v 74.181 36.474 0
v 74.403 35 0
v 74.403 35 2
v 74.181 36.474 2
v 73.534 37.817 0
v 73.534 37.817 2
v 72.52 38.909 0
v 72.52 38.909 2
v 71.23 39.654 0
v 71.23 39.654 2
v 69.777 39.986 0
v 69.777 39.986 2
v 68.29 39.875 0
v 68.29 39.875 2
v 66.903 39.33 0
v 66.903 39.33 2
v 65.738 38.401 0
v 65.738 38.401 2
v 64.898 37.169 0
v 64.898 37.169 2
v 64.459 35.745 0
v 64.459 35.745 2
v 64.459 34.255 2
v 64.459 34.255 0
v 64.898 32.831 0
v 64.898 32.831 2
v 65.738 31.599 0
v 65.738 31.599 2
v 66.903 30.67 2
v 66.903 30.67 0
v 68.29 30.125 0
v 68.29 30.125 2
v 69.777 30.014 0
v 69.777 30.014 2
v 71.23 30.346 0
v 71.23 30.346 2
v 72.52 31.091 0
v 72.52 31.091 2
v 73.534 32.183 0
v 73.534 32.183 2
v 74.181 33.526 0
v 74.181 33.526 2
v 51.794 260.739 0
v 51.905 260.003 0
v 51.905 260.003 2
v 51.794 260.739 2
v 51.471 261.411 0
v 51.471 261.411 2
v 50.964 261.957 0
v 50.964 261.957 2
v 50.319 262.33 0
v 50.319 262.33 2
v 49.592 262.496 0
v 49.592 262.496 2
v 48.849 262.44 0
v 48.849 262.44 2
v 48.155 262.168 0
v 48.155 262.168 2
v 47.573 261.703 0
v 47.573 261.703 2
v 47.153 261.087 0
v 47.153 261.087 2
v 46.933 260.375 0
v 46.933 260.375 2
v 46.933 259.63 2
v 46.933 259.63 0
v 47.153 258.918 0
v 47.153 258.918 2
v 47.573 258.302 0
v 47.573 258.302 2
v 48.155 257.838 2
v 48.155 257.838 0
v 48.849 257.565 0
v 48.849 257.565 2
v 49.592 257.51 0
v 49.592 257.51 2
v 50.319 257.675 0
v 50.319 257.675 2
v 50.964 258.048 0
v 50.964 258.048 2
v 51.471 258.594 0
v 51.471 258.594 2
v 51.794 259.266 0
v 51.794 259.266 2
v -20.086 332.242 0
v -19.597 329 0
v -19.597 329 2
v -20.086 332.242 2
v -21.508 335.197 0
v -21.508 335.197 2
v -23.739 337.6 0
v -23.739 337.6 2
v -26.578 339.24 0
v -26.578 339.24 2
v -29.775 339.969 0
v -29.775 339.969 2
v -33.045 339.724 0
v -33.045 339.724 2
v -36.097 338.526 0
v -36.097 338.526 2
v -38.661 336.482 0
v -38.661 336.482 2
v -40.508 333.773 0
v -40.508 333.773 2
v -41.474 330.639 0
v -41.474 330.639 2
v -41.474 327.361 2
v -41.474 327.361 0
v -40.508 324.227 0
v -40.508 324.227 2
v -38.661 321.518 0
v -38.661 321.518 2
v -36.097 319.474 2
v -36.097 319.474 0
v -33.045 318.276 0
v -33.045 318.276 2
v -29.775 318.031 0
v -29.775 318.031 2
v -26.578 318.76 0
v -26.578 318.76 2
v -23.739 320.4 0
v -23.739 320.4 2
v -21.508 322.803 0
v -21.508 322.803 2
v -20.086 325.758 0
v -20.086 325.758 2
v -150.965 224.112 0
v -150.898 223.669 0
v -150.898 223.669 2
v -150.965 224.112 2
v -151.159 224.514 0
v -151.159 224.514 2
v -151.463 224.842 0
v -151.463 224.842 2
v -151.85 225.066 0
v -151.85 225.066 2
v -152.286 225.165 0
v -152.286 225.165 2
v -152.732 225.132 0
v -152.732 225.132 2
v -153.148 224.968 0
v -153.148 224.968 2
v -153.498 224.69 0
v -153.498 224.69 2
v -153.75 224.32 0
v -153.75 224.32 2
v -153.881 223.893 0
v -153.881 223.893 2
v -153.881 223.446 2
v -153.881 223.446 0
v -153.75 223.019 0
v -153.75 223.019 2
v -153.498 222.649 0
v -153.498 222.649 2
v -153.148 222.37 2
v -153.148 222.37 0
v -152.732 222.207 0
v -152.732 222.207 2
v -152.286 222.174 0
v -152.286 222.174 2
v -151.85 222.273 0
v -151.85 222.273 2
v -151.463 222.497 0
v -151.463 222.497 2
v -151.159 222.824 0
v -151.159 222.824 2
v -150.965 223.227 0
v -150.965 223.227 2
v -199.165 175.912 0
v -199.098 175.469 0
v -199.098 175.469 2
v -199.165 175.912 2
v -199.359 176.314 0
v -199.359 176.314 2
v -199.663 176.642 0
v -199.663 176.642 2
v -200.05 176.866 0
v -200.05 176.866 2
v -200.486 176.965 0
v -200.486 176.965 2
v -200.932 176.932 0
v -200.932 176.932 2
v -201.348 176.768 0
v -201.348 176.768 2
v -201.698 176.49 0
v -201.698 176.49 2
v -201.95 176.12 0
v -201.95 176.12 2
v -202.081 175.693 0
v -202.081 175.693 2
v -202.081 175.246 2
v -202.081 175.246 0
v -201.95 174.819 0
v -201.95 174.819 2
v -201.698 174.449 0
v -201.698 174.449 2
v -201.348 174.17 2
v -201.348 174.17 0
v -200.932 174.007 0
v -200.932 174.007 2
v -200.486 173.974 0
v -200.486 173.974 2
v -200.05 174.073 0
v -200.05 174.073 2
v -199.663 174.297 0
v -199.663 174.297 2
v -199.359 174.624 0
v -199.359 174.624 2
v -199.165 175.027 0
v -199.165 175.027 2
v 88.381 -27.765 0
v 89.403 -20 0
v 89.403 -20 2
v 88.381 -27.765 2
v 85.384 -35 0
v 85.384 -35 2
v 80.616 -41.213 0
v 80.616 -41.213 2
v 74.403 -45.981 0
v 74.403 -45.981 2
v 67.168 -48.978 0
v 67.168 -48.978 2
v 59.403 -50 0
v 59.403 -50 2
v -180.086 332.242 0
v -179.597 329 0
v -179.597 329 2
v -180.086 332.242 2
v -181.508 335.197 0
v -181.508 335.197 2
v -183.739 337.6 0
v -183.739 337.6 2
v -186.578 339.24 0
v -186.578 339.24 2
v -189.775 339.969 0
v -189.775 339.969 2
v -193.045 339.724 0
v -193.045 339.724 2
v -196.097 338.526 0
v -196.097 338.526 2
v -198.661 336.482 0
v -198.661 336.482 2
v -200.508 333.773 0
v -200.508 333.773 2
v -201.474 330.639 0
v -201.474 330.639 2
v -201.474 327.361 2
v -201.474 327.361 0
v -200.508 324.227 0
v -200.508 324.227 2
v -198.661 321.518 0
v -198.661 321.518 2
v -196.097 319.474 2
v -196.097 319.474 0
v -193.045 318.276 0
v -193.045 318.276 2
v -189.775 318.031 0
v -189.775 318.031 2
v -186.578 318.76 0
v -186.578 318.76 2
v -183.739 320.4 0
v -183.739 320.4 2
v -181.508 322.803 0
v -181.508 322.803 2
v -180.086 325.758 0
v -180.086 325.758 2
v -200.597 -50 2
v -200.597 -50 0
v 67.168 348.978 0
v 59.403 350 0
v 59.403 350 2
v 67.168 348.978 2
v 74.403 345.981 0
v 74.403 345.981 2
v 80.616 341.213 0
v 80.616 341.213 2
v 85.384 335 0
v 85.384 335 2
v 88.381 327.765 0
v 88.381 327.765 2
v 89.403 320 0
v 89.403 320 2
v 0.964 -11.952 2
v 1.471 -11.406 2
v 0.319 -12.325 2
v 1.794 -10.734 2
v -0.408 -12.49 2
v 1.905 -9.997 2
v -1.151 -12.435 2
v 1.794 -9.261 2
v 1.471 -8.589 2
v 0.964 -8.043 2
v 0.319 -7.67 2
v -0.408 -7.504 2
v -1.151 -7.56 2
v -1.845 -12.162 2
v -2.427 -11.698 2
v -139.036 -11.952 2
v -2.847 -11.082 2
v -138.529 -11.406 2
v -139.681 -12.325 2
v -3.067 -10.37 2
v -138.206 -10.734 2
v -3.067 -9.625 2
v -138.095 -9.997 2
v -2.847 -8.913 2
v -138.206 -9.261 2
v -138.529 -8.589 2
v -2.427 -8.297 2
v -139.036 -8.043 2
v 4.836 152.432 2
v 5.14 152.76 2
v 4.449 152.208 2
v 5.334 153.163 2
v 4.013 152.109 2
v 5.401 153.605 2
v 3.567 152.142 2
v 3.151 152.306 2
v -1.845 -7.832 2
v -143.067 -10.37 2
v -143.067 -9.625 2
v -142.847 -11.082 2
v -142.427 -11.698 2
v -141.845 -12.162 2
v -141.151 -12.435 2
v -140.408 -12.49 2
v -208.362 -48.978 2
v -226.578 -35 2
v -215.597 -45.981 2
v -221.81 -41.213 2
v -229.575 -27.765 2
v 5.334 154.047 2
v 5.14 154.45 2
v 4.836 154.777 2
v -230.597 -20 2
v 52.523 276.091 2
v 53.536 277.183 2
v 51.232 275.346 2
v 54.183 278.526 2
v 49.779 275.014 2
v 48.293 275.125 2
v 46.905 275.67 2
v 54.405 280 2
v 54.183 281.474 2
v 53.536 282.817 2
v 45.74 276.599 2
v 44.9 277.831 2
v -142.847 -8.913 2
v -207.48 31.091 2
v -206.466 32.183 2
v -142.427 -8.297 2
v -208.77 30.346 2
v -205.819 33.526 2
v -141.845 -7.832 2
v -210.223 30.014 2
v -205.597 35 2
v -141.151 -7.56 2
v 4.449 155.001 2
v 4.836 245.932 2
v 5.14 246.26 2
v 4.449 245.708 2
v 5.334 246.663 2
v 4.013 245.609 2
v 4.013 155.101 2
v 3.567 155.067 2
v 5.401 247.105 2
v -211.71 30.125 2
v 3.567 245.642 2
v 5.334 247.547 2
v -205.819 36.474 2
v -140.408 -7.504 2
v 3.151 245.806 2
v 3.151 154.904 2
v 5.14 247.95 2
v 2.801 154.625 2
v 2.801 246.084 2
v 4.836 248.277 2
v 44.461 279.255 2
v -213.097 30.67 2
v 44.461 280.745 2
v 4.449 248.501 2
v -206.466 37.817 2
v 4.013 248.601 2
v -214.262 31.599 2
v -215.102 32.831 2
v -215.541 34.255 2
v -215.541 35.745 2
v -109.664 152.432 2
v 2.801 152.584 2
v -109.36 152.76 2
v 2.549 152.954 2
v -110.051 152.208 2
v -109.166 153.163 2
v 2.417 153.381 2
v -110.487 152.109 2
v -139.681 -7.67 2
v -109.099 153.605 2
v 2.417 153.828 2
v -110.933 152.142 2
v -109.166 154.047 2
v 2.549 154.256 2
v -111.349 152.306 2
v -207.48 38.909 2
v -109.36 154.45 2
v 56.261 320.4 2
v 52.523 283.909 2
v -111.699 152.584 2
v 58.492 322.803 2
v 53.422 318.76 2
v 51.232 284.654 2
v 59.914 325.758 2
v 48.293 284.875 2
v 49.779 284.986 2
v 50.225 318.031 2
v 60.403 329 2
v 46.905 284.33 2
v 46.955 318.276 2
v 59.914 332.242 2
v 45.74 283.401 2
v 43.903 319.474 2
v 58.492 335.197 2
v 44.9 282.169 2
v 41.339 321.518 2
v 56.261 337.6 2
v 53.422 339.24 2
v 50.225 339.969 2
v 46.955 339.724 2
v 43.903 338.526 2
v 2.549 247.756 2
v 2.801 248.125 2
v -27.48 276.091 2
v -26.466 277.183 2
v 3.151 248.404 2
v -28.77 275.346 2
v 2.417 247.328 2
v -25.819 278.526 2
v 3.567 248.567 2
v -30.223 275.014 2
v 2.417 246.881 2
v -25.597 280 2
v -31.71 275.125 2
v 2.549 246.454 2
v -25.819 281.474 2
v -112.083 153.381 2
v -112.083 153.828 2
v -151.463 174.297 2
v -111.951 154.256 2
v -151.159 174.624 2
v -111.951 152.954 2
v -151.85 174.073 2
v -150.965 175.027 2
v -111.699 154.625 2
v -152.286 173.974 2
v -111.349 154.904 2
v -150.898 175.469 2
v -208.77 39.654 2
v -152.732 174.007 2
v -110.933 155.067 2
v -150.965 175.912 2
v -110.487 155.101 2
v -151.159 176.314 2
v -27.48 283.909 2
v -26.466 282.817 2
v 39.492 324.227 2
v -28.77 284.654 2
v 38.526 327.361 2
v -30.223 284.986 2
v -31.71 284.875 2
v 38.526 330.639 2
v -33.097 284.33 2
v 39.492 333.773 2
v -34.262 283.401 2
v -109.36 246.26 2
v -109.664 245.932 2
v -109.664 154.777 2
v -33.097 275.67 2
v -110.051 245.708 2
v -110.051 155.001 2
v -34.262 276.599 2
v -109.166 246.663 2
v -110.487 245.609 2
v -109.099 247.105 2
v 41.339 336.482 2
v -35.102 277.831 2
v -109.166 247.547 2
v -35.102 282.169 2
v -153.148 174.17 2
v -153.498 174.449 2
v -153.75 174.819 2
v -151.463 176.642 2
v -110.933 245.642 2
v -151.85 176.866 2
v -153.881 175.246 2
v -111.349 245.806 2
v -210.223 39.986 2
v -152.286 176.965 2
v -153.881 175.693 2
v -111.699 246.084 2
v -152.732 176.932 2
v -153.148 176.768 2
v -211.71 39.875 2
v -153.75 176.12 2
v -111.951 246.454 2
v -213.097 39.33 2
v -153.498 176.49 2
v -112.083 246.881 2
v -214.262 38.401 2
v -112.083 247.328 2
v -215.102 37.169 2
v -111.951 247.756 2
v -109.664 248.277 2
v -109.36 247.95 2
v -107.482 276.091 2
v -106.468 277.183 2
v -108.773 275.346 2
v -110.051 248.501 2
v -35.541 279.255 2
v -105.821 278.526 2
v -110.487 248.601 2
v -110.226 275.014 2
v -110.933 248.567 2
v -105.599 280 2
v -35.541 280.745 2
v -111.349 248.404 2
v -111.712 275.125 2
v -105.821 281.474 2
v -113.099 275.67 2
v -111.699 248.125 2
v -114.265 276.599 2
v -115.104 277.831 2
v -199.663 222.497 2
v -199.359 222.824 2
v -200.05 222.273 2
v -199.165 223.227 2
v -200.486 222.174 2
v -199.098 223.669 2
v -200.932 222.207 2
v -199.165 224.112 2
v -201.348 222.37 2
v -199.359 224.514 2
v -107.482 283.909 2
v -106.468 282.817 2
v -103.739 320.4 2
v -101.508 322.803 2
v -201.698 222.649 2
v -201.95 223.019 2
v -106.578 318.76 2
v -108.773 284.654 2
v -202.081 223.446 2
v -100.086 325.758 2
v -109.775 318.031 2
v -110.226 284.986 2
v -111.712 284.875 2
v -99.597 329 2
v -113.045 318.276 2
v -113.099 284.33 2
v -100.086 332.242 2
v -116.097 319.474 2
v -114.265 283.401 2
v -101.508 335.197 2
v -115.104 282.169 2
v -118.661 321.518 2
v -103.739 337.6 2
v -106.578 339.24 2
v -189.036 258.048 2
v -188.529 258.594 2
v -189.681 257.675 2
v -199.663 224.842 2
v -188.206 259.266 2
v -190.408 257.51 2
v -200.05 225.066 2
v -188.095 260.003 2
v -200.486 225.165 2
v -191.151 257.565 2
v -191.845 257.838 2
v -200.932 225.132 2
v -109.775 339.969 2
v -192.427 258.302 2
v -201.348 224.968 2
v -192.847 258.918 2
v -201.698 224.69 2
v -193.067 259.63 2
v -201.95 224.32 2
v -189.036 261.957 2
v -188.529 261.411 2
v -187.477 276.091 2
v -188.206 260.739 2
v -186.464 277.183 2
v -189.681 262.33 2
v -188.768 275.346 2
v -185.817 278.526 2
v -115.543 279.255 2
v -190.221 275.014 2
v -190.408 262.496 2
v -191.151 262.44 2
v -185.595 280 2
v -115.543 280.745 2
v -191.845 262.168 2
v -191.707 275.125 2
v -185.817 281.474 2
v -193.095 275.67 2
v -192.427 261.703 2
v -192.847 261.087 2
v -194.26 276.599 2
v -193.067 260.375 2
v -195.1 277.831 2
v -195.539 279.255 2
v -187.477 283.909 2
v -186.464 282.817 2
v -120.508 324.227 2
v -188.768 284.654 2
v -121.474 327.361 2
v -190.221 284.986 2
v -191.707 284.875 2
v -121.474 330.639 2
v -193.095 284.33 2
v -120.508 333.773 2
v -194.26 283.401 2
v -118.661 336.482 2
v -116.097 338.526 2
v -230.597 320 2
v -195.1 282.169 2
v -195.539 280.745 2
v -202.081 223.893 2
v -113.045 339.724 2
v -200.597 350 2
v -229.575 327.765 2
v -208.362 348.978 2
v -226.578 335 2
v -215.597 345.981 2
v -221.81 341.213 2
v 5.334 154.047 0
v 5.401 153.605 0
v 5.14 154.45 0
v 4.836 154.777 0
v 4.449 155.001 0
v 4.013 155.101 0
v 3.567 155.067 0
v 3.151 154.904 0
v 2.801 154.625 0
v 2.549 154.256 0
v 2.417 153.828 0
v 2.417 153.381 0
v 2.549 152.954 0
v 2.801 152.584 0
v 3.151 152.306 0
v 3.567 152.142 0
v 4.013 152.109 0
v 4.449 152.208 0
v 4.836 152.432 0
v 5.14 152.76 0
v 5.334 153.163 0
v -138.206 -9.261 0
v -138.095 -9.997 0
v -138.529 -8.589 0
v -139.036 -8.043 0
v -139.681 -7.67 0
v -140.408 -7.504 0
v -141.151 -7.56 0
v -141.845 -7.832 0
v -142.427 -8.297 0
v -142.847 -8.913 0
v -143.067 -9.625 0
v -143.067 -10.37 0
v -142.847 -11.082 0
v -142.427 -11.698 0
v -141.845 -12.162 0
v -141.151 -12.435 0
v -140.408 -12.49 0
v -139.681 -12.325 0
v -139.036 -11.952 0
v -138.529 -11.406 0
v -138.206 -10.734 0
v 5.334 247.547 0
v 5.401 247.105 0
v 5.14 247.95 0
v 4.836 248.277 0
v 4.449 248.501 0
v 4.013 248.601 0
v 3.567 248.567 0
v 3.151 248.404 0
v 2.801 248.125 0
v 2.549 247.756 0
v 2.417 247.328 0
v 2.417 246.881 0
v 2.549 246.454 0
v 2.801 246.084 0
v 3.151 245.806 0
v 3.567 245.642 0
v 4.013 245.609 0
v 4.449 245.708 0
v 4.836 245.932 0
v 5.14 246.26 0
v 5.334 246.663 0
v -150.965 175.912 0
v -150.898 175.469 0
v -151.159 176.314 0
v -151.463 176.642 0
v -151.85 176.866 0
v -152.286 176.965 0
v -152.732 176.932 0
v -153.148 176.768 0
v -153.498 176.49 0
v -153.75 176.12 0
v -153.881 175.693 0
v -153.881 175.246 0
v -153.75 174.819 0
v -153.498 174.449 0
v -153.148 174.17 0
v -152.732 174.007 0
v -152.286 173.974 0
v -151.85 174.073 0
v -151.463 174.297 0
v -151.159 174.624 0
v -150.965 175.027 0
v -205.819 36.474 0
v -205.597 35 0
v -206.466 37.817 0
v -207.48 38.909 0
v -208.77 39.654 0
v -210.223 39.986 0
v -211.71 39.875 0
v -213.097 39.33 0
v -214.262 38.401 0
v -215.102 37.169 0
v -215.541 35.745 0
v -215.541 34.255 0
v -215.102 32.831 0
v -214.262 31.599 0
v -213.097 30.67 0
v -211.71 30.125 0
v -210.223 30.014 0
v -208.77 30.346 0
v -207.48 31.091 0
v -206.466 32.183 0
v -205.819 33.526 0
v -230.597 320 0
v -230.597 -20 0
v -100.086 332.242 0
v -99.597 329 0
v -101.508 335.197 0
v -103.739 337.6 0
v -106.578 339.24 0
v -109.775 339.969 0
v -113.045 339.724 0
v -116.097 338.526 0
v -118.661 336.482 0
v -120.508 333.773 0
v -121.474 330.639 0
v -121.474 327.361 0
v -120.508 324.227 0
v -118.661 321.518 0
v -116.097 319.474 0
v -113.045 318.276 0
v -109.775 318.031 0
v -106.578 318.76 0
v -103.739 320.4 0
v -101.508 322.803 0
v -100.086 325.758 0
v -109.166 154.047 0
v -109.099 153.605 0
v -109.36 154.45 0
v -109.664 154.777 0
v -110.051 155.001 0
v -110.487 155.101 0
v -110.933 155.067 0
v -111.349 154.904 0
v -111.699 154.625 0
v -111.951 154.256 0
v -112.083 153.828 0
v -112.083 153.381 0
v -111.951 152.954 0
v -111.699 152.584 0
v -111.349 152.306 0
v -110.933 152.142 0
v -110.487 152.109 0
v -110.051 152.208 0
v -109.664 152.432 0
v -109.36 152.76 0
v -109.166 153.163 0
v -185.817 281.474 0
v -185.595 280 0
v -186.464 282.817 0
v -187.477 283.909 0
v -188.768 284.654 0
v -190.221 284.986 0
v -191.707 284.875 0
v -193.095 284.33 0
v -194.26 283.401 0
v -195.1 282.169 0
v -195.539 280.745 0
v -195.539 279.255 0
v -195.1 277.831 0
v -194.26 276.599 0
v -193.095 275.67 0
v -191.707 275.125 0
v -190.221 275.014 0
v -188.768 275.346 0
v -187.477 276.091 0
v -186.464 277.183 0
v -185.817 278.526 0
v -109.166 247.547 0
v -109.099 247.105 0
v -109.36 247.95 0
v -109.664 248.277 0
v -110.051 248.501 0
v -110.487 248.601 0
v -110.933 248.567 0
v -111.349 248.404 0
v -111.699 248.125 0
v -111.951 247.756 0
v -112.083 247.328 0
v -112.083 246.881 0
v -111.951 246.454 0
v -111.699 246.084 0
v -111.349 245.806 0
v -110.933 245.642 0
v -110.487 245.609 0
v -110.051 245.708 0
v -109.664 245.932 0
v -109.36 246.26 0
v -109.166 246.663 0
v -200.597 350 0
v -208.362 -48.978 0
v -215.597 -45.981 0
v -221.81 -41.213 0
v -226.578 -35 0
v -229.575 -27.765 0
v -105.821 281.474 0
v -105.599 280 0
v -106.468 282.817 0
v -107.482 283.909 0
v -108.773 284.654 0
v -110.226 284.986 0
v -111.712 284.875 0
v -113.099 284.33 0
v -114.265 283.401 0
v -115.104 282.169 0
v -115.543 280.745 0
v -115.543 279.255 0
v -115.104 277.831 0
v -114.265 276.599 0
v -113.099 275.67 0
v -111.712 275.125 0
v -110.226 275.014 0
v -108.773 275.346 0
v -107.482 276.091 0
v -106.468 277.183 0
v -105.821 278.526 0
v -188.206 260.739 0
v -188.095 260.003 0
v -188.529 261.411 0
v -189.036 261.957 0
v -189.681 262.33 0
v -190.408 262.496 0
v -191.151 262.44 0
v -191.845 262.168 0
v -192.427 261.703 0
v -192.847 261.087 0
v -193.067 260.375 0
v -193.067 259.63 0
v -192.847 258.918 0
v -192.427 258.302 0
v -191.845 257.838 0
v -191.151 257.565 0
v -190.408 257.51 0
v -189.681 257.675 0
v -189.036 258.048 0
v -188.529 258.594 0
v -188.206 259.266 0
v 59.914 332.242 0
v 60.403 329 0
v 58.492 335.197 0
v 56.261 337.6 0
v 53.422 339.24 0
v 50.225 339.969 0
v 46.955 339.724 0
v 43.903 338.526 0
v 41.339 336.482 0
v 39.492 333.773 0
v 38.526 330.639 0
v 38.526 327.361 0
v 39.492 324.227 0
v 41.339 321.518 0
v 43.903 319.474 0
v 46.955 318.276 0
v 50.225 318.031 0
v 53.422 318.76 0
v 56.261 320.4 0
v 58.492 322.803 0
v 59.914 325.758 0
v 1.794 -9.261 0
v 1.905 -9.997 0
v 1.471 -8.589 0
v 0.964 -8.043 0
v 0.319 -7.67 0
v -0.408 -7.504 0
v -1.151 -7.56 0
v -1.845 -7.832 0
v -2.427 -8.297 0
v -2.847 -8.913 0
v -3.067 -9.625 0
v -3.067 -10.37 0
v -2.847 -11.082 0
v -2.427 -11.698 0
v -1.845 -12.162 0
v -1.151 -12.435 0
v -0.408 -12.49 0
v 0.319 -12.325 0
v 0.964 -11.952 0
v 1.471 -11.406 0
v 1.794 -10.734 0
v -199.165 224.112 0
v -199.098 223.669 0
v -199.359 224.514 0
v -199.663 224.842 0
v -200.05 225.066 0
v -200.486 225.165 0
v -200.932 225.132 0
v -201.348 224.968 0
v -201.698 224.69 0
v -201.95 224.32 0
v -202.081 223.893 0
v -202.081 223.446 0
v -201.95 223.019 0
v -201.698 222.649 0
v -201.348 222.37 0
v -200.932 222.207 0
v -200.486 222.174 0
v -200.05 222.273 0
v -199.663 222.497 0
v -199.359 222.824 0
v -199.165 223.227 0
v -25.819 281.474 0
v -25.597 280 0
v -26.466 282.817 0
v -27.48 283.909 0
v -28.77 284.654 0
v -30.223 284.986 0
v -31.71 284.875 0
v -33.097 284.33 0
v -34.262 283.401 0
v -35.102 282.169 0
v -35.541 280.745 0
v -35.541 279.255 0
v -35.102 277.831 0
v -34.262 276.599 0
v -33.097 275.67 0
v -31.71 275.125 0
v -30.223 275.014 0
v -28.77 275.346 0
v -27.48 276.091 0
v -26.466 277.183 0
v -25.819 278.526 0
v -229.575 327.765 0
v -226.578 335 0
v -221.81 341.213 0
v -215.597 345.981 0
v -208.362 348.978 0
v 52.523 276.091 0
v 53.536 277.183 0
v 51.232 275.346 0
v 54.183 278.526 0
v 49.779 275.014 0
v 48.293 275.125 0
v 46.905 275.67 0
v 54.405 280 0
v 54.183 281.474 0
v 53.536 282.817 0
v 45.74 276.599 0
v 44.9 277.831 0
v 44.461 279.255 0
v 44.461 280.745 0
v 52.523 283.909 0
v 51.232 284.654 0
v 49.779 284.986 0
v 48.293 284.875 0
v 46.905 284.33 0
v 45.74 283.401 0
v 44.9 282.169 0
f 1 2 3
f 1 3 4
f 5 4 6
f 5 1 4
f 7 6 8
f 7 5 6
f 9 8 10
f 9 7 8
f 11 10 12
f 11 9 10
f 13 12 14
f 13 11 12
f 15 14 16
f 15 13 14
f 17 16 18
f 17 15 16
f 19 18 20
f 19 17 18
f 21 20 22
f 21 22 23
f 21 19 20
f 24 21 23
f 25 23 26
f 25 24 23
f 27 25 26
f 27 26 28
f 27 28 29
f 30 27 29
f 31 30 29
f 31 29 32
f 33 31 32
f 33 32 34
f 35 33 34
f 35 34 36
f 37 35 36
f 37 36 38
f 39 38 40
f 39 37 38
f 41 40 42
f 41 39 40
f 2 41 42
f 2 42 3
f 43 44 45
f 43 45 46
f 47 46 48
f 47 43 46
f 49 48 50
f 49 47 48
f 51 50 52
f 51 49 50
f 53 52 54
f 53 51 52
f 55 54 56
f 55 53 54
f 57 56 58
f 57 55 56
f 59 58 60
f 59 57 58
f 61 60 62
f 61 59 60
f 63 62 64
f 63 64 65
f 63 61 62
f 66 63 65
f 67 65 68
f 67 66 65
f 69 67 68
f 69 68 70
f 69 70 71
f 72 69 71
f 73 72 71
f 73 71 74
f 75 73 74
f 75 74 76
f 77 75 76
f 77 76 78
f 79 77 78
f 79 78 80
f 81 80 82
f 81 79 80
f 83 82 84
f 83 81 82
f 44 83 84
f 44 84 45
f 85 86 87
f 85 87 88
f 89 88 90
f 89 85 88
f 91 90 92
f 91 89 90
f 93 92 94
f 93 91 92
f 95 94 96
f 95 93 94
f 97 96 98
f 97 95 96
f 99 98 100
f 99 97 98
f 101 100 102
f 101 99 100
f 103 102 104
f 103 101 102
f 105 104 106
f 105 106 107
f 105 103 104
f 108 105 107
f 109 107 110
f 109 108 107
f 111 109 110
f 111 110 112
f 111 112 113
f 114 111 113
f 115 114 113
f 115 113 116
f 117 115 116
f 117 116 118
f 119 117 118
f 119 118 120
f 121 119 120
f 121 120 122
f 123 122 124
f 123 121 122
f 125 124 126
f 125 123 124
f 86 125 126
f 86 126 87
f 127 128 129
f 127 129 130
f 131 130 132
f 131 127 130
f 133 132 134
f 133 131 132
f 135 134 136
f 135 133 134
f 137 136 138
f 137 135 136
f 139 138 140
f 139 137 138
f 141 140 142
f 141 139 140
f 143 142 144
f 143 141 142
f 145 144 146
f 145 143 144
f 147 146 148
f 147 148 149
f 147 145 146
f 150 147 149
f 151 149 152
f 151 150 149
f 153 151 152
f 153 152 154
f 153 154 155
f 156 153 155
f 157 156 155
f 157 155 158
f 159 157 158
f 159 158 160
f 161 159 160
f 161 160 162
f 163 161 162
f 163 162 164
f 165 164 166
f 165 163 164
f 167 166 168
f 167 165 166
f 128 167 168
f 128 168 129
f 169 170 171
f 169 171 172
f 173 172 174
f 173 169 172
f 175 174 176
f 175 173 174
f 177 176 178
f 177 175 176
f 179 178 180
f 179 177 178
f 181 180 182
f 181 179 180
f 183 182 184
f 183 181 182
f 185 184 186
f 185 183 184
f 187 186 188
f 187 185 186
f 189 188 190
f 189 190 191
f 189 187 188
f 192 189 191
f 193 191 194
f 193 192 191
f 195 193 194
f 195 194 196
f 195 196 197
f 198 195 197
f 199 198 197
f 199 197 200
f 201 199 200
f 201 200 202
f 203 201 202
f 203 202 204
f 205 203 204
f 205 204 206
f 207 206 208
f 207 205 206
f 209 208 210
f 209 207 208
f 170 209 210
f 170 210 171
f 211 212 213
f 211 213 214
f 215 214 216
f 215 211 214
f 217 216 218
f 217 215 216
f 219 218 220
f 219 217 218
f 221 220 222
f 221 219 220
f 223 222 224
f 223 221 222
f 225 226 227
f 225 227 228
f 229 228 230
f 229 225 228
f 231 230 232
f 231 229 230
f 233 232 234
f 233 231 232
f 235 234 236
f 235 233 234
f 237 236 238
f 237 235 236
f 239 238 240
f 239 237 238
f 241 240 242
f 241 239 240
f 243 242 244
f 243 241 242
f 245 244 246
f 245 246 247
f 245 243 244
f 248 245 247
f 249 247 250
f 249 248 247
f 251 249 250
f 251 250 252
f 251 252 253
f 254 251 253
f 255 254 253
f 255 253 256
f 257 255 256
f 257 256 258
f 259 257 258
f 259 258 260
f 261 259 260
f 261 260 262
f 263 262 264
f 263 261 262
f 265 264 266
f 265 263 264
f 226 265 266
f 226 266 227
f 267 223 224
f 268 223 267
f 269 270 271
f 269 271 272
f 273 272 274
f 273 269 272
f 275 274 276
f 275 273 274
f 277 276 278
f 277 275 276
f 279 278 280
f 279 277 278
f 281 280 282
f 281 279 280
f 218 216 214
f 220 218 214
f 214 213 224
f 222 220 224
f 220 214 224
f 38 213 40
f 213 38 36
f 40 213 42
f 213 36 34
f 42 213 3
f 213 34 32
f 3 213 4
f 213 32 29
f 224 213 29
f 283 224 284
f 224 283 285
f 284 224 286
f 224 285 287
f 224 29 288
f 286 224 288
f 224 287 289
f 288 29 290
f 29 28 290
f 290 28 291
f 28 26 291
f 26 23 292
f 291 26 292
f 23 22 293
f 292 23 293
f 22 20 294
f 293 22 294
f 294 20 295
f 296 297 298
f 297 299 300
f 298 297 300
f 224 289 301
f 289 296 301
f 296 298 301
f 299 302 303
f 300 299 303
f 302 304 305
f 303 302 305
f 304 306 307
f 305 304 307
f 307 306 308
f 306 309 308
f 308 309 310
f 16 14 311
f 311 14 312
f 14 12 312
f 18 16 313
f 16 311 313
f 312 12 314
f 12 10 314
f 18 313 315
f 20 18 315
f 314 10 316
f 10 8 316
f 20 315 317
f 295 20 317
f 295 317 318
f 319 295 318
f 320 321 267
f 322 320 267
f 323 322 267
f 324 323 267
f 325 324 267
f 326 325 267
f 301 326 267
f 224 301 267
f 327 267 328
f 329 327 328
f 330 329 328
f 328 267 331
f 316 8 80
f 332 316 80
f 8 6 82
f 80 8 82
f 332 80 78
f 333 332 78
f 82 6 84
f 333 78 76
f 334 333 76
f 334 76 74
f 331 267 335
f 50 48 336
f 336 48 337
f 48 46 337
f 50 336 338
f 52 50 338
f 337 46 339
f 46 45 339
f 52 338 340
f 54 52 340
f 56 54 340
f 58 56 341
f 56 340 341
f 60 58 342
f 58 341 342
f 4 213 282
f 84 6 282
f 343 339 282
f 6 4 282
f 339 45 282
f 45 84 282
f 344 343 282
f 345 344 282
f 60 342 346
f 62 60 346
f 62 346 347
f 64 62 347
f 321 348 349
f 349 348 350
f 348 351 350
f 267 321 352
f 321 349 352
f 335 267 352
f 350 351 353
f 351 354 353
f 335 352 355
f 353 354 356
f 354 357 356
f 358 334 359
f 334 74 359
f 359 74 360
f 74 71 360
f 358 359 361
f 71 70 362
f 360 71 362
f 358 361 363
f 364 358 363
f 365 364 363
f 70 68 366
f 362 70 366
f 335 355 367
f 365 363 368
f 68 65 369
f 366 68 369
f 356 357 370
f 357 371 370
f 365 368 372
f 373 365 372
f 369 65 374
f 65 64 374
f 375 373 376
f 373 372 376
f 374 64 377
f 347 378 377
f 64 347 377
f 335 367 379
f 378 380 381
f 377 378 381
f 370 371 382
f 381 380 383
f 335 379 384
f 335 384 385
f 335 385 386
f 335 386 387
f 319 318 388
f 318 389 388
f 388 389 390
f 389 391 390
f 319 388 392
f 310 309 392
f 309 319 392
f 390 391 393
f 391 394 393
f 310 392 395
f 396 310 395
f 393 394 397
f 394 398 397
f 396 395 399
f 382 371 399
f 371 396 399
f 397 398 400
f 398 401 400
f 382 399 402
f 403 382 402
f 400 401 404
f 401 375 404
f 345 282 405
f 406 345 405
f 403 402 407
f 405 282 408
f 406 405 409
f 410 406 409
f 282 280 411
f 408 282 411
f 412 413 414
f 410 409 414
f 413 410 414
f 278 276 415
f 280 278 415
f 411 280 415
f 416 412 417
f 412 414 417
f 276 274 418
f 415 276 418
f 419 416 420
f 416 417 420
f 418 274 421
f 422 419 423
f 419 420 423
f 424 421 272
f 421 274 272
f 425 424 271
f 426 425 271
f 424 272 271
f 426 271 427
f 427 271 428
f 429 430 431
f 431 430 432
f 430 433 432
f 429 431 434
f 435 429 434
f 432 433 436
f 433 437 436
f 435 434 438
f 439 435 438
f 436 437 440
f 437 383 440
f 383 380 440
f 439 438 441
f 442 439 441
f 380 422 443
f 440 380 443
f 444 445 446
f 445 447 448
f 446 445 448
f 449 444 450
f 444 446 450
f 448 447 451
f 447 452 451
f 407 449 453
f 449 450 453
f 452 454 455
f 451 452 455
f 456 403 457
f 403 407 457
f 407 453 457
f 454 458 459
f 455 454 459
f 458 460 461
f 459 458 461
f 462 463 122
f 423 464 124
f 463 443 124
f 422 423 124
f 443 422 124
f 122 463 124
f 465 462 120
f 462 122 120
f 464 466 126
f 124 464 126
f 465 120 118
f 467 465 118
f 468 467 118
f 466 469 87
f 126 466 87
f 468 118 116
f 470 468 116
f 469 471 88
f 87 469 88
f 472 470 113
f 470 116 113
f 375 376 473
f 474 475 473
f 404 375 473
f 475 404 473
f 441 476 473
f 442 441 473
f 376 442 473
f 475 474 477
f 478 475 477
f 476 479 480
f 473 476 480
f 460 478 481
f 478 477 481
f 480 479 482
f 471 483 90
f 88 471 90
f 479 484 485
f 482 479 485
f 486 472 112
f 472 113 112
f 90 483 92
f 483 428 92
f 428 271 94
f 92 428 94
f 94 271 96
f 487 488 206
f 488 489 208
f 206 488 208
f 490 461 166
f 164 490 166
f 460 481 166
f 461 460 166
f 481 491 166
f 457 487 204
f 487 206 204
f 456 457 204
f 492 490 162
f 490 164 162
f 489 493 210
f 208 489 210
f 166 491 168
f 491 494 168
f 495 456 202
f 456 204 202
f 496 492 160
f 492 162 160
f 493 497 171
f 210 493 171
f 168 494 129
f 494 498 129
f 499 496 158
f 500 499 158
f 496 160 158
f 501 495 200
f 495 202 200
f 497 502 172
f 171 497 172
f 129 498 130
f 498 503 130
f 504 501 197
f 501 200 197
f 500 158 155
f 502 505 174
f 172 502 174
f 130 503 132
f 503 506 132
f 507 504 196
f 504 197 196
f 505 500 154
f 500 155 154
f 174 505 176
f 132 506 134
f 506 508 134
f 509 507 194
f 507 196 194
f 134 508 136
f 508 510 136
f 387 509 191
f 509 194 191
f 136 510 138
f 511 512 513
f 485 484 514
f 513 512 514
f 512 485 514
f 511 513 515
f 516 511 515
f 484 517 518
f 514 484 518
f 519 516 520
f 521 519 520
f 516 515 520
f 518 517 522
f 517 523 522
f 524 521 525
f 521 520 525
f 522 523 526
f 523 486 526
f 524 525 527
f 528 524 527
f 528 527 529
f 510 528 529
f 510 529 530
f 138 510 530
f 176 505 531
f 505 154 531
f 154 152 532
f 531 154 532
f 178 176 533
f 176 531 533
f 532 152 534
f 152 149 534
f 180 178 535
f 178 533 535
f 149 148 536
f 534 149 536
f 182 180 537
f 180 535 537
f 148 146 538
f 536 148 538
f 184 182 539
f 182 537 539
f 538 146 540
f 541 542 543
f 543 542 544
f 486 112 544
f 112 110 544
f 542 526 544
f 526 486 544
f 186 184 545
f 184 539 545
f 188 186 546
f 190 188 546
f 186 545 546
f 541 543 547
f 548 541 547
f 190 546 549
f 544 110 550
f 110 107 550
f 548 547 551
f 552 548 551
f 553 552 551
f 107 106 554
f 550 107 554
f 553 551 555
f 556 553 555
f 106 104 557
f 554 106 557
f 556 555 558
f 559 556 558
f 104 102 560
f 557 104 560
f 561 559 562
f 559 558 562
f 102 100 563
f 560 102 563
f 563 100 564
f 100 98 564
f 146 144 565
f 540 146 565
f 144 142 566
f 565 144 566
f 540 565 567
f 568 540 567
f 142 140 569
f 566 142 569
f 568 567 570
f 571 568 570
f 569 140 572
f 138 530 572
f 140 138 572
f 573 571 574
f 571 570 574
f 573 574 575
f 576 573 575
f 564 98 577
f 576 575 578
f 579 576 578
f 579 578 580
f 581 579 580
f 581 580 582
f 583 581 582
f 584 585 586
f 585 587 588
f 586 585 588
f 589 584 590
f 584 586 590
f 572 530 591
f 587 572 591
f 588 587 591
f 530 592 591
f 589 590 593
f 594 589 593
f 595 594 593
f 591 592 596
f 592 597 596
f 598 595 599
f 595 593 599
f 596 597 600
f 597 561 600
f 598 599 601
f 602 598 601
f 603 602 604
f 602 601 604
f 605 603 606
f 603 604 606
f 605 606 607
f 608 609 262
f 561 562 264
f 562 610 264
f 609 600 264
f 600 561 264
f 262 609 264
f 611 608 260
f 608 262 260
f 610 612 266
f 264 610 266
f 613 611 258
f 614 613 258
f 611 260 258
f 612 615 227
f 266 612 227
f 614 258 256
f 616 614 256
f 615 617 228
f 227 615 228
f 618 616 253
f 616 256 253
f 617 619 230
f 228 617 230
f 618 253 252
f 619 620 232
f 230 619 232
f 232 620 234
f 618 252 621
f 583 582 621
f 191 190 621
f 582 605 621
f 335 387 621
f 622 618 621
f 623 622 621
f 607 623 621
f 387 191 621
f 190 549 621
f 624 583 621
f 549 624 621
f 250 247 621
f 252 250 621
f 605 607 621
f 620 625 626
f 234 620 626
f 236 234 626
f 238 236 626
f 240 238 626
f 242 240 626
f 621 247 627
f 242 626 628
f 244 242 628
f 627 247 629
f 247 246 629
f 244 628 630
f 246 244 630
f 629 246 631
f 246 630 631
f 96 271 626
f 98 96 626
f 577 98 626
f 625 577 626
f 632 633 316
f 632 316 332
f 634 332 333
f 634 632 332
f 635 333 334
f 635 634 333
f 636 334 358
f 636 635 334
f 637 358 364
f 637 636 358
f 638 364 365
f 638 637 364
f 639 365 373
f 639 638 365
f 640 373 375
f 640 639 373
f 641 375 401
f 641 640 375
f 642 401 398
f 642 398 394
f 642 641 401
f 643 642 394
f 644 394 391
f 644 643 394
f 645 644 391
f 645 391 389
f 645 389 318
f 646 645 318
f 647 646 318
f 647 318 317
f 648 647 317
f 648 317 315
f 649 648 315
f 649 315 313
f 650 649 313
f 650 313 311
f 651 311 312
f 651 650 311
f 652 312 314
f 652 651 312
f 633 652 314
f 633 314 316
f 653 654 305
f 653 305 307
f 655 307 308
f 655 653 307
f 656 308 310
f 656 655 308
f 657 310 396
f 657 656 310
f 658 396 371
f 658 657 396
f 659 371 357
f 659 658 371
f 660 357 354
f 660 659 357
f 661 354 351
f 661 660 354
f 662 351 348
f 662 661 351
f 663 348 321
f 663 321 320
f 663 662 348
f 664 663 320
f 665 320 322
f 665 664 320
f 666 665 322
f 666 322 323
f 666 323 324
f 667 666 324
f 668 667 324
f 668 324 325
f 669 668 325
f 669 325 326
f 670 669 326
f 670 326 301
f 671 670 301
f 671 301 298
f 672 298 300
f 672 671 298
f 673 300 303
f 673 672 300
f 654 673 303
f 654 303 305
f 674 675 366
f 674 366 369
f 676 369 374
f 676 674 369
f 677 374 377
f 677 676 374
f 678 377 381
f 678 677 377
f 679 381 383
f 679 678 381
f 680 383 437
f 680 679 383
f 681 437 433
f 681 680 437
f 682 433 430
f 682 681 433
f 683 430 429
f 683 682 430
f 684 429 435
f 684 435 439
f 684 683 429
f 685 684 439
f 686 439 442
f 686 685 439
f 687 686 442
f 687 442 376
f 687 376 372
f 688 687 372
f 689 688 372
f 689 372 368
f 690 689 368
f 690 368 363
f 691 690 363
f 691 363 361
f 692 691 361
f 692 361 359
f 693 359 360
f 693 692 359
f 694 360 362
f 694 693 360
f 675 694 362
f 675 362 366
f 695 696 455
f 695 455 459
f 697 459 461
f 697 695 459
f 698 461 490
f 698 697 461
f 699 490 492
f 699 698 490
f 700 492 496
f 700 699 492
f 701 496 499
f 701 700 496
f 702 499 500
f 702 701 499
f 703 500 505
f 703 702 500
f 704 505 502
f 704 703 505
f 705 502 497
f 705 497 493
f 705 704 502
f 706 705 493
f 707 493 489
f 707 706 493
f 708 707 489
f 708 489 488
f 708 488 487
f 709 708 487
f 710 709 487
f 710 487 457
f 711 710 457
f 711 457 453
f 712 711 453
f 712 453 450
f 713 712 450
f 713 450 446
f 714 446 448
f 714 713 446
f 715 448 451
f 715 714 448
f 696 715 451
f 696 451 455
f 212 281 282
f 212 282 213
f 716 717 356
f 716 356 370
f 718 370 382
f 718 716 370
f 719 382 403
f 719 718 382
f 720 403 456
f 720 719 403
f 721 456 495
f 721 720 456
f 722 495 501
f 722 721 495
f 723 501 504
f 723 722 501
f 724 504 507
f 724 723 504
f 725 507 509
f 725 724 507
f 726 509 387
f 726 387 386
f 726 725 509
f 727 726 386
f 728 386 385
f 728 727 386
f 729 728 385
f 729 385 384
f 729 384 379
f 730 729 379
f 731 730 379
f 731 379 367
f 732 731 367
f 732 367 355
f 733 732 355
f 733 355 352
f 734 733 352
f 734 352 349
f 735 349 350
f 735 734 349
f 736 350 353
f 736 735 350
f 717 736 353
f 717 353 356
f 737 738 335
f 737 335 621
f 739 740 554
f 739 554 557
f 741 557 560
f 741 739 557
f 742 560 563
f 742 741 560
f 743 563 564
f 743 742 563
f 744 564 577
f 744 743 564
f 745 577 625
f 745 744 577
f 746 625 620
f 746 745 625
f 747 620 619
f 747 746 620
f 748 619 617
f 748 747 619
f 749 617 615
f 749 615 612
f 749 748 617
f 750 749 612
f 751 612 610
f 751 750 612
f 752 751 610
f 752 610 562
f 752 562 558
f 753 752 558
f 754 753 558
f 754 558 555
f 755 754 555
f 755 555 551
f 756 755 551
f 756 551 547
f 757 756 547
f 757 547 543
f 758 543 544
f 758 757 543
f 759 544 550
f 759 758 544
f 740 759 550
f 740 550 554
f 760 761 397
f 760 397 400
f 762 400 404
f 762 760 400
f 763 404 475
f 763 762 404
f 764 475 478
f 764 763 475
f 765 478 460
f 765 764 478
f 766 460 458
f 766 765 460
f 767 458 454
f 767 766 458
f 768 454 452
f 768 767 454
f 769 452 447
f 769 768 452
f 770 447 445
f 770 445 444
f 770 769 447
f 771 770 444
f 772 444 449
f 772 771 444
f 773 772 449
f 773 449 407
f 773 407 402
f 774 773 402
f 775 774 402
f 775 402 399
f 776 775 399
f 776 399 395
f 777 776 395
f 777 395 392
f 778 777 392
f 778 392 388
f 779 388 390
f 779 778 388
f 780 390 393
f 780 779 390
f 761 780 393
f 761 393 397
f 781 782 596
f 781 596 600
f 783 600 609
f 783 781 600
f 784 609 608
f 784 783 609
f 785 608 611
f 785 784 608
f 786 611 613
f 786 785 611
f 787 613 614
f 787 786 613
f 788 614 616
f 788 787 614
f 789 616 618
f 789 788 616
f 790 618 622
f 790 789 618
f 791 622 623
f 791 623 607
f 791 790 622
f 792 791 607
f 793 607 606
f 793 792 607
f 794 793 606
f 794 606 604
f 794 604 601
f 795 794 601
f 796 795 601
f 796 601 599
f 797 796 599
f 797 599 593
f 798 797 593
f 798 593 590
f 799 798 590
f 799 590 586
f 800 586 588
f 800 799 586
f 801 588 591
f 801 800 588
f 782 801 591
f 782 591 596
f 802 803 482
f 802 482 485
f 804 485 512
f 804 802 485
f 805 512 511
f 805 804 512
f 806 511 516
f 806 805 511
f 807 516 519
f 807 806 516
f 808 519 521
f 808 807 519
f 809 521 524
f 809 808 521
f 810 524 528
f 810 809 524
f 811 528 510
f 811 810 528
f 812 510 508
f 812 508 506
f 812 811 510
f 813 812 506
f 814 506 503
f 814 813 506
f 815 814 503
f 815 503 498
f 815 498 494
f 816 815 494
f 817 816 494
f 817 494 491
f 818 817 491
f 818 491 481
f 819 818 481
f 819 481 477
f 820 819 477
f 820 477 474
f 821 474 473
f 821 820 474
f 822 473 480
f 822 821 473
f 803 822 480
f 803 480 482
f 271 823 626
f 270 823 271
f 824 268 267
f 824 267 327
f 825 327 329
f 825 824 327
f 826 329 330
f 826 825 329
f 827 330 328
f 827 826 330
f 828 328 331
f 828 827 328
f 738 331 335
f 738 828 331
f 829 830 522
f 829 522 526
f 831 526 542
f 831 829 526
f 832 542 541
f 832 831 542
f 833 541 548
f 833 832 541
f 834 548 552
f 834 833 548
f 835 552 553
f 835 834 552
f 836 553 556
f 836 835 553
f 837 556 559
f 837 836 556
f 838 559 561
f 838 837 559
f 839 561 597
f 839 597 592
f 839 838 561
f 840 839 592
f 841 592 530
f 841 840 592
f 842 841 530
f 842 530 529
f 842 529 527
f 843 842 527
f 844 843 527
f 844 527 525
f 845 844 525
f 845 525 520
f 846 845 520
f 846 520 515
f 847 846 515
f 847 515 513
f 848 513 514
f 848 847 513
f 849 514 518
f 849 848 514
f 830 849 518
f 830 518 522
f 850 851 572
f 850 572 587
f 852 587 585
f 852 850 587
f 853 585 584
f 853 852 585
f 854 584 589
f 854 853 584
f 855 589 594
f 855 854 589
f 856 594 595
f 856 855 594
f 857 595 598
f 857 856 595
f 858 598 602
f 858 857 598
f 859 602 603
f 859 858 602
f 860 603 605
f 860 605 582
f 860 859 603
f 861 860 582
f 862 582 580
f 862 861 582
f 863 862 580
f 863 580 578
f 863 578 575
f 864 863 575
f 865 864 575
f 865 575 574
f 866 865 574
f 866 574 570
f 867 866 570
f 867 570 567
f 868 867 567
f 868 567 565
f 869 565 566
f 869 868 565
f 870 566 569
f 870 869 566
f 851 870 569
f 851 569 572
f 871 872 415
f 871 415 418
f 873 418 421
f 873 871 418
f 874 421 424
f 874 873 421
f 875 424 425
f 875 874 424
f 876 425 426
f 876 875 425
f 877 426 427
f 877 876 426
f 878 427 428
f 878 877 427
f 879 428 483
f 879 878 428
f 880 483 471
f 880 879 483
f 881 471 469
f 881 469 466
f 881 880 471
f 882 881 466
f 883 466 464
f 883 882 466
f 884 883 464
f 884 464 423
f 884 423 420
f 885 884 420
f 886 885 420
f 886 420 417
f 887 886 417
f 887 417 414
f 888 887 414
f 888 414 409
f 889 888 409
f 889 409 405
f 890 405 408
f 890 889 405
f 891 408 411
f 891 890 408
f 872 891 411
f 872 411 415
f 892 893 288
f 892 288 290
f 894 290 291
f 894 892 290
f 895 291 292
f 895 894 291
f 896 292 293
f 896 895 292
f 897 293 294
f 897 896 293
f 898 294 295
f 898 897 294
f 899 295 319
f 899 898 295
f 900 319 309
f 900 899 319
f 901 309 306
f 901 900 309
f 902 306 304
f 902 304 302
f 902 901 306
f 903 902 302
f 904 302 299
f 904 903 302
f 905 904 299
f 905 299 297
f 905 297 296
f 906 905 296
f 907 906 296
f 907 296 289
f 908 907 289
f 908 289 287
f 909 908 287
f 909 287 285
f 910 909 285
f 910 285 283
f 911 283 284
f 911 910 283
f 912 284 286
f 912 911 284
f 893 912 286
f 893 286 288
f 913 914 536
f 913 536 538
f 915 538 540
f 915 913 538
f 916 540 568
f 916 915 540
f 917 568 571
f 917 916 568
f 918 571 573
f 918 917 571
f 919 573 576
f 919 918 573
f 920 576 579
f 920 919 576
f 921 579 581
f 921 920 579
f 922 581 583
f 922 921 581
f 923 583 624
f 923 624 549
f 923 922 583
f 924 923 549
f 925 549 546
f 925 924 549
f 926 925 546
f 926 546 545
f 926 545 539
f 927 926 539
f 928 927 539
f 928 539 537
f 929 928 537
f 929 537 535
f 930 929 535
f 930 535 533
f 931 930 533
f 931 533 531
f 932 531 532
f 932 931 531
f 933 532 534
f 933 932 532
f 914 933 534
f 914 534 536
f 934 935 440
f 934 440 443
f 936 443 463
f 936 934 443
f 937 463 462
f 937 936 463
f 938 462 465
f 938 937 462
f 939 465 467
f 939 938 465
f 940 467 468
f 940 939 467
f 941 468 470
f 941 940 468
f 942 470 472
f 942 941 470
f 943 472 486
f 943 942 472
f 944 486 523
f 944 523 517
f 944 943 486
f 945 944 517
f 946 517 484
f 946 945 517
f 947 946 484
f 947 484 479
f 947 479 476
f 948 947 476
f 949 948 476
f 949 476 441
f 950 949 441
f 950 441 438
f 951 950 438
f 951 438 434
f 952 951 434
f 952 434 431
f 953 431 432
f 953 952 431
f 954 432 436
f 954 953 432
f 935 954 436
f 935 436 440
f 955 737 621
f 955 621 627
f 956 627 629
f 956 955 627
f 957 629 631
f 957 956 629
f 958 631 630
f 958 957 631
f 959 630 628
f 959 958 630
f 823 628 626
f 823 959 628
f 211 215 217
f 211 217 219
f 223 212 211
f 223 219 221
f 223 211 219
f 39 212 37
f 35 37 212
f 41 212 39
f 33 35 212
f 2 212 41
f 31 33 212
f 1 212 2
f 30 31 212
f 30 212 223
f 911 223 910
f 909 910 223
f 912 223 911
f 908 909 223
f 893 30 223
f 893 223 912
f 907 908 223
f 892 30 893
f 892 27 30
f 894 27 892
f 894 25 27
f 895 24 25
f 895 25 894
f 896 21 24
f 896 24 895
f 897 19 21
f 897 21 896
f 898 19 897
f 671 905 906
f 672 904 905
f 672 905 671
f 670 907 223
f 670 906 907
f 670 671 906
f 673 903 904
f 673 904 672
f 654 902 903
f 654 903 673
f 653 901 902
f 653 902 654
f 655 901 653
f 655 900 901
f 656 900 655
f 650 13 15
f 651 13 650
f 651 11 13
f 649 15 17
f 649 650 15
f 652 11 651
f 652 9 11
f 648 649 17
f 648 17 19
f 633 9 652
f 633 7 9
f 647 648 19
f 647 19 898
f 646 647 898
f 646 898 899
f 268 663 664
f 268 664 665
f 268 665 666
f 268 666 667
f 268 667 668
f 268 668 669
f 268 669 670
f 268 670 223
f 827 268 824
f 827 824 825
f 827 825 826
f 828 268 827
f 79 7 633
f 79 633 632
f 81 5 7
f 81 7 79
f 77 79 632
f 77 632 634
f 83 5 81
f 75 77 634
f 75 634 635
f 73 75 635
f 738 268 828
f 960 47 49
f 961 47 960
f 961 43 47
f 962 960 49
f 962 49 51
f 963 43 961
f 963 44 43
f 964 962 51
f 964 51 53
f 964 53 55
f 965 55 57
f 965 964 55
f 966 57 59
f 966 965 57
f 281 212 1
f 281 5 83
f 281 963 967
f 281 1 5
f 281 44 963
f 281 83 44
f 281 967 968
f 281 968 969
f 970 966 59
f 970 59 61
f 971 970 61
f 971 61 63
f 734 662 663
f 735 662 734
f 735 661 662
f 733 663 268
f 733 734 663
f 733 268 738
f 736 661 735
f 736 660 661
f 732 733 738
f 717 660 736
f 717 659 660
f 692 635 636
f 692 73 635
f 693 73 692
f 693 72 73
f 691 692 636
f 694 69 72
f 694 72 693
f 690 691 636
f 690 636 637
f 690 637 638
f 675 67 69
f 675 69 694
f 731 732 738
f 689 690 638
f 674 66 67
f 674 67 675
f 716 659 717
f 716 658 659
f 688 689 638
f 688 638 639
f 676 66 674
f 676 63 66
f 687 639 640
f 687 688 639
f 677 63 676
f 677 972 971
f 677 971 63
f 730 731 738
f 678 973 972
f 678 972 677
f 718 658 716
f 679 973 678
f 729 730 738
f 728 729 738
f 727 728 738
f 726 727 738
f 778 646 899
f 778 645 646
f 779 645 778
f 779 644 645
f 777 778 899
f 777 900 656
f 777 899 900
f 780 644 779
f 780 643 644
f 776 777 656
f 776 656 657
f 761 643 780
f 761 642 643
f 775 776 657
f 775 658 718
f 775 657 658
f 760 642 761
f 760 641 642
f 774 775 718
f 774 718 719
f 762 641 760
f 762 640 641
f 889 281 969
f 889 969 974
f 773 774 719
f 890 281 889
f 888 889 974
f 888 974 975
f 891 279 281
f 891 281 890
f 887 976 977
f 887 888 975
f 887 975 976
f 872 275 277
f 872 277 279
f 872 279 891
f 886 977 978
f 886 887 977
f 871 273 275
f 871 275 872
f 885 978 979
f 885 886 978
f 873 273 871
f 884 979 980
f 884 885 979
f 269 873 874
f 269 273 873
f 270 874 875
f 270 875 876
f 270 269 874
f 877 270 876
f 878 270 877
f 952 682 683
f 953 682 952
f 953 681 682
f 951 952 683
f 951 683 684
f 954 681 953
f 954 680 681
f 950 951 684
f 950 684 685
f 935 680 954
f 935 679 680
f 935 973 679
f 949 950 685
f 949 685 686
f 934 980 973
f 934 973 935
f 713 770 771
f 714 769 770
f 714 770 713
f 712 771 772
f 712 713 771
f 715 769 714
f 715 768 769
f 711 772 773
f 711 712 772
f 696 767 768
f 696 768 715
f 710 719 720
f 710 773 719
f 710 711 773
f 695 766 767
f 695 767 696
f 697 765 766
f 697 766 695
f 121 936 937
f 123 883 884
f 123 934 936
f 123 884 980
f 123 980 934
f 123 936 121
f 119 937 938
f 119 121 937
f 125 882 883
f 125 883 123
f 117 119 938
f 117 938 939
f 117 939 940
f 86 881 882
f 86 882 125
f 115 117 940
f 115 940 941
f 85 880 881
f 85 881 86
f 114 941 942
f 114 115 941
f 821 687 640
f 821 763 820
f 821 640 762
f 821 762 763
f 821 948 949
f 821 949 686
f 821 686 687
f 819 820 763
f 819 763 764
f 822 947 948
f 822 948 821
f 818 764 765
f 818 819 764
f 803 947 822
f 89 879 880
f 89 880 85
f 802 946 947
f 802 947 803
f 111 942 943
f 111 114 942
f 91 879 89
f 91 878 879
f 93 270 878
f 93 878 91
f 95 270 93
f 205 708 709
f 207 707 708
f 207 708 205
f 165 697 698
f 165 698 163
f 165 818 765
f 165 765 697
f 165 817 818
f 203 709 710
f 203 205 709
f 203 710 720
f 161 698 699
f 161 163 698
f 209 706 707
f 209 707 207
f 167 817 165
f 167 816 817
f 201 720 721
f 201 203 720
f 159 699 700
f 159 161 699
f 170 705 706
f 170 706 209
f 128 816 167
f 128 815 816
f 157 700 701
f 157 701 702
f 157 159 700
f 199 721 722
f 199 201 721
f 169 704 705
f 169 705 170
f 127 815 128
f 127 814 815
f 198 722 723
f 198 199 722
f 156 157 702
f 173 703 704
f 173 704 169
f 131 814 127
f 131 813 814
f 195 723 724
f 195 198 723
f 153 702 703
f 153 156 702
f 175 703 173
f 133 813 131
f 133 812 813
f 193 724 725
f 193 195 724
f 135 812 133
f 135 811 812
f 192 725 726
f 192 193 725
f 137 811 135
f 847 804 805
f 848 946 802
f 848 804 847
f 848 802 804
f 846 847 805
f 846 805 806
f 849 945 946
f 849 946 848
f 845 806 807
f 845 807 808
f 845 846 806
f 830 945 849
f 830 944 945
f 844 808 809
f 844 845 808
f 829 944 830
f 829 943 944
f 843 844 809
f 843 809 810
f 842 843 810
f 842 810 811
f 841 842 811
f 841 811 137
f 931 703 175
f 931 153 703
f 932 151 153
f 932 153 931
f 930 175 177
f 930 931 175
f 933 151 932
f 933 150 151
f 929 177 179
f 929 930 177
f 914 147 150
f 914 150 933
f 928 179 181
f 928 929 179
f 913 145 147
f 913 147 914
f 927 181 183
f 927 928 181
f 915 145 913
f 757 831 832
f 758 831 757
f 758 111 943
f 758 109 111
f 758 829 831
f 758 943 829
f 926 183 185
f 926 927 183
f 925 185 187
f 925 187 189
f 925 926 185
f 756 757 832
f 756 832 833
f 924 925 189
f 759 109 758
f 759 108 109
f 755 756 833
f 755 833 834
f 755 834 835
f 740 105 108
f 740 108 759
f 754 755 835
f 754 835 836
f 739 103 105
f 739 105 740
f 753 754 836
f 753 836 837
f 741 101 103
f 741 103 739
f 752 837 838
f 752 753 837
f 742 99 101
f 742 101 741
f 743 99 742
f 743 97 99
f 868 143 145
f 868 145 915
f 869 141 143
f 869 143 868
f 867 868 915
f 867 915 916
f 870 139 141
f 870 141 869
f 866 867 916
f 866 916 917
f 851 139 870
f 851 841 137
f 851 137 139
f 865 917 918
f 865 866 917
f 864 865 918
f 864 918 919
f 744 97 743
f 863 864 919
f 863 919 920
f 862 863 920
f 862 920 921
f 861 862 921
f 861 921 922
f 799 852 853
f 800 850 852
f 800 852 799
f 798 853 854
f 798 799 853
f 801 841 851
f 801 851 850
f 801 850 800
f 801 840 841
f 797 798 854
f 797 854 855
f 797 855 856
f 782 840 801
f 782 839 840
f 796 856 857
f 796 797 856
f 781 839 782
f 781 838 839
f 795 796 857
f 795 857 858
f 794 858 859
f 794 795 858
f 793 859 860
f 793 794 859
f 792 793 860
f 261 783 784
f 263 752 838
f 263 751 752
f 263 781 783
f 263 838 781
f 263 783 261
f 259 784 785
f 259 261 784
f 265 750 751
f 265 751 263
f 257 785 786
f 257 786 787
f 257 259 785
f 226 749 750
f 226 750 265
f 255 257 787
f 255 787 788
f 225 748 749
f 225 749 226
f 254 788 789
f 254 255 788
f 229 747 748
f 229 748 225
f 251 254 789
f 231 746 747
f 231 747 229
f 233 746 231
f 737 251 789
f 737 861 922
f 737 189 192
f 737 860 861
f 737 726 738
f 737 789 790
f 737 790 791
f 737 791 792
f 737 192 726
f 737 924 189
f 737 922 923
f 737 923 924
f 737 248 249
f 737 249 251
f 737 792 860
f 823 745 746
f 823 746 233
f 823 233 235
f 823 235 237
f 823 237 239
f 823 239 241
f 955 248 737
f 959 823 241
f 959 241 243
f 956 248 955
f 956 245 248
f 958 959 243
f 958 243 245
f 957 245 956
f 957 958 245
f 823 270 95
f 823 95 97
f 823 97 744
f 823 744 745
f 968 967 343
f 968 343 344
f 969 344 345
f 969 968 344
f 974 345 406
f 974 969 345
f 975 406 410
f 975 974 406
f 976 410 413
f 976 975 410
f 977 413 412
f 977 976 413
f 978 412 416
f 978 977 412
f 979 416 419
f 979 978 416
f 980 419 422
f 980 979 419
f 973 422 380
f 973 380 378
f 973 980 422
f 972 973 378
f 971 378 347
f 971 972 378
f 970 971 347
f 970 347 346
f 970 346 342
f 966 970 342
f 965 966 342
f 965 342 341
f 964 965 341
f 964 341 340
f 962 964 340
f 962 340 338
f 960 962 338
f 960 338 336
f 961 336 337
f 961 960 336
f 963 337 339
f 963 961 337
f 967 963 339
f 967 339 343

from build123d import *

# Parameters (mm, degrees)
SKETCH_1_R      = 2.5
SKETCH_1_R_2    = 11
SKETCH_1_R_3    = 5
SKETCH_1_R_4    = 1.5
EXTRUDE_1_DEPTH = 2


with BuildPart() as part:
    # 草图1 → 凸台-拉伸1 (new body)
    with BuildSketch(Plane.XY):
        with BuildLine():
            Line((-200.597014925, 350), (59.402985075, 350))
            ThreePointArc((59.402985075, 350), (80.61618851, 341.213203436), (89.402985075, 320))
            Line((89.402985075, 320), (89.402985075, -20))
            ThreePointArc((89.402985075, -20), (80.61618851, -41.213203436), (59.402985075, -50))
            Line((59.402985075, -50), (-200.597014925, -50))
            ThreePointArc((-200.597014925, -50), (-221.810218361, -41.213203436), (-230.597014925, -20))
            Line((-230.597014925, -20), (-230.597014925, 320))
            ThreePointArc((-230.597014925, 320), (-221.810218361, 341.213203436), (-200.597014925, 350))
        make_face()
        with Locations((-190.594777504, 260.002592391)):
            Circle(SKETCH_1_R, mode=Mode.SUBTRACT)
        with Locations((49.405222496, 260.002592391)):
            Circle(SKETCH_1_R, mode=Mode.SUBTRACT)
        with Locations((-140.594777504, -9.997407609)):
            Circle(SKETCH_1_R, mode=Mode.SUBTRACT)
        with Locations((-0.594777504, -9.997407609)):
            Circle(SKETCH_1_R, mode=Mode.SUBTRACT)
        with Locations((-110.597014925, 329)):
            Circle(SKETCH_1_R_2, mode=Mode.SUBTRACT)
        with Locations((-30.597014925, 329)):
            Circle(SKETCH_1_R_2, mode=Mode.SUBTRACT)
        with Locations((-190.597014925, 329)):
            Circle(SKETCH_1_R_2, mode=Mode.SUBTRACT)
        with Locations((49.402985075, 329)):
            Circle(SKETCH_1_R_2, mode=Mode.SUBTRACT)
        with Locations((-210.597014925, 35)):
            Circle(SKETCH_1_R_3, mode=Mode.SUBTRACT)
        with Locations((69.402985075, 35)):
            Circle(SKETCH_1_R_3, mode=Mode.SUBTRACT)
        with Locations((-110.599294274, 247.104711047)):
            Circle(SKETCH_1_R_4, mode=Mode.SUBTRACT)
        with Locations((-110.599294274, 153.604711047)):
            Circle(SKETCH_1_R_4, mode=Mode.SUBTRACT)
        with Locations((3.900705726, 153.604711047)):
            Circle(SKETCH_1_R_4, mode=Mode.SUBTRACT)
        with Locations((3.900705726, 247.104711047)):
            Circle(SKETCH_1_R_4, mode=Mode.SUBTRACT)
        with Locations((-200.598097779, 223.669448039)):
            Circle(SKETCH_1_R_4, mode=Mode.SUBTRACT)
        with Locations((-152.398097779, 223.669448039)):
            Circle(SKETCH_1_R_4, mode=Mode.SUBTRACT)
        with Locations((-200.598097779, 175.469448039)):
            Circle(SKETCH_1_R_4, mode=Mode.SUBTRACT)
        with Locations((-152.398097779, 175.469448039)):
            Circle(SKETCH_1_R_4, mode=Mode.SUBTRACT)
        with Locations((-30.597014925, 280)):
            Circle(SKETCH_1_R_3, mode=Mode.SUBTRACT)
        with Locations((-190.594777504, 280)):
            Circle(SKETCH_1_R_3, mode=Mode.SUBTRACT)
        with Locations((-110.599294274, 280)):
            Circle(SKETCH_1_R_3, mode=Mode.SUBTRACT)
        with Locations((49.405222496, 280)):
            Circle(SKETCH_1_R_3, mode=Mode.SUBTRACT)
    extrude(amount=EXTRUDE_1_DEPTH)


solid = part.part
